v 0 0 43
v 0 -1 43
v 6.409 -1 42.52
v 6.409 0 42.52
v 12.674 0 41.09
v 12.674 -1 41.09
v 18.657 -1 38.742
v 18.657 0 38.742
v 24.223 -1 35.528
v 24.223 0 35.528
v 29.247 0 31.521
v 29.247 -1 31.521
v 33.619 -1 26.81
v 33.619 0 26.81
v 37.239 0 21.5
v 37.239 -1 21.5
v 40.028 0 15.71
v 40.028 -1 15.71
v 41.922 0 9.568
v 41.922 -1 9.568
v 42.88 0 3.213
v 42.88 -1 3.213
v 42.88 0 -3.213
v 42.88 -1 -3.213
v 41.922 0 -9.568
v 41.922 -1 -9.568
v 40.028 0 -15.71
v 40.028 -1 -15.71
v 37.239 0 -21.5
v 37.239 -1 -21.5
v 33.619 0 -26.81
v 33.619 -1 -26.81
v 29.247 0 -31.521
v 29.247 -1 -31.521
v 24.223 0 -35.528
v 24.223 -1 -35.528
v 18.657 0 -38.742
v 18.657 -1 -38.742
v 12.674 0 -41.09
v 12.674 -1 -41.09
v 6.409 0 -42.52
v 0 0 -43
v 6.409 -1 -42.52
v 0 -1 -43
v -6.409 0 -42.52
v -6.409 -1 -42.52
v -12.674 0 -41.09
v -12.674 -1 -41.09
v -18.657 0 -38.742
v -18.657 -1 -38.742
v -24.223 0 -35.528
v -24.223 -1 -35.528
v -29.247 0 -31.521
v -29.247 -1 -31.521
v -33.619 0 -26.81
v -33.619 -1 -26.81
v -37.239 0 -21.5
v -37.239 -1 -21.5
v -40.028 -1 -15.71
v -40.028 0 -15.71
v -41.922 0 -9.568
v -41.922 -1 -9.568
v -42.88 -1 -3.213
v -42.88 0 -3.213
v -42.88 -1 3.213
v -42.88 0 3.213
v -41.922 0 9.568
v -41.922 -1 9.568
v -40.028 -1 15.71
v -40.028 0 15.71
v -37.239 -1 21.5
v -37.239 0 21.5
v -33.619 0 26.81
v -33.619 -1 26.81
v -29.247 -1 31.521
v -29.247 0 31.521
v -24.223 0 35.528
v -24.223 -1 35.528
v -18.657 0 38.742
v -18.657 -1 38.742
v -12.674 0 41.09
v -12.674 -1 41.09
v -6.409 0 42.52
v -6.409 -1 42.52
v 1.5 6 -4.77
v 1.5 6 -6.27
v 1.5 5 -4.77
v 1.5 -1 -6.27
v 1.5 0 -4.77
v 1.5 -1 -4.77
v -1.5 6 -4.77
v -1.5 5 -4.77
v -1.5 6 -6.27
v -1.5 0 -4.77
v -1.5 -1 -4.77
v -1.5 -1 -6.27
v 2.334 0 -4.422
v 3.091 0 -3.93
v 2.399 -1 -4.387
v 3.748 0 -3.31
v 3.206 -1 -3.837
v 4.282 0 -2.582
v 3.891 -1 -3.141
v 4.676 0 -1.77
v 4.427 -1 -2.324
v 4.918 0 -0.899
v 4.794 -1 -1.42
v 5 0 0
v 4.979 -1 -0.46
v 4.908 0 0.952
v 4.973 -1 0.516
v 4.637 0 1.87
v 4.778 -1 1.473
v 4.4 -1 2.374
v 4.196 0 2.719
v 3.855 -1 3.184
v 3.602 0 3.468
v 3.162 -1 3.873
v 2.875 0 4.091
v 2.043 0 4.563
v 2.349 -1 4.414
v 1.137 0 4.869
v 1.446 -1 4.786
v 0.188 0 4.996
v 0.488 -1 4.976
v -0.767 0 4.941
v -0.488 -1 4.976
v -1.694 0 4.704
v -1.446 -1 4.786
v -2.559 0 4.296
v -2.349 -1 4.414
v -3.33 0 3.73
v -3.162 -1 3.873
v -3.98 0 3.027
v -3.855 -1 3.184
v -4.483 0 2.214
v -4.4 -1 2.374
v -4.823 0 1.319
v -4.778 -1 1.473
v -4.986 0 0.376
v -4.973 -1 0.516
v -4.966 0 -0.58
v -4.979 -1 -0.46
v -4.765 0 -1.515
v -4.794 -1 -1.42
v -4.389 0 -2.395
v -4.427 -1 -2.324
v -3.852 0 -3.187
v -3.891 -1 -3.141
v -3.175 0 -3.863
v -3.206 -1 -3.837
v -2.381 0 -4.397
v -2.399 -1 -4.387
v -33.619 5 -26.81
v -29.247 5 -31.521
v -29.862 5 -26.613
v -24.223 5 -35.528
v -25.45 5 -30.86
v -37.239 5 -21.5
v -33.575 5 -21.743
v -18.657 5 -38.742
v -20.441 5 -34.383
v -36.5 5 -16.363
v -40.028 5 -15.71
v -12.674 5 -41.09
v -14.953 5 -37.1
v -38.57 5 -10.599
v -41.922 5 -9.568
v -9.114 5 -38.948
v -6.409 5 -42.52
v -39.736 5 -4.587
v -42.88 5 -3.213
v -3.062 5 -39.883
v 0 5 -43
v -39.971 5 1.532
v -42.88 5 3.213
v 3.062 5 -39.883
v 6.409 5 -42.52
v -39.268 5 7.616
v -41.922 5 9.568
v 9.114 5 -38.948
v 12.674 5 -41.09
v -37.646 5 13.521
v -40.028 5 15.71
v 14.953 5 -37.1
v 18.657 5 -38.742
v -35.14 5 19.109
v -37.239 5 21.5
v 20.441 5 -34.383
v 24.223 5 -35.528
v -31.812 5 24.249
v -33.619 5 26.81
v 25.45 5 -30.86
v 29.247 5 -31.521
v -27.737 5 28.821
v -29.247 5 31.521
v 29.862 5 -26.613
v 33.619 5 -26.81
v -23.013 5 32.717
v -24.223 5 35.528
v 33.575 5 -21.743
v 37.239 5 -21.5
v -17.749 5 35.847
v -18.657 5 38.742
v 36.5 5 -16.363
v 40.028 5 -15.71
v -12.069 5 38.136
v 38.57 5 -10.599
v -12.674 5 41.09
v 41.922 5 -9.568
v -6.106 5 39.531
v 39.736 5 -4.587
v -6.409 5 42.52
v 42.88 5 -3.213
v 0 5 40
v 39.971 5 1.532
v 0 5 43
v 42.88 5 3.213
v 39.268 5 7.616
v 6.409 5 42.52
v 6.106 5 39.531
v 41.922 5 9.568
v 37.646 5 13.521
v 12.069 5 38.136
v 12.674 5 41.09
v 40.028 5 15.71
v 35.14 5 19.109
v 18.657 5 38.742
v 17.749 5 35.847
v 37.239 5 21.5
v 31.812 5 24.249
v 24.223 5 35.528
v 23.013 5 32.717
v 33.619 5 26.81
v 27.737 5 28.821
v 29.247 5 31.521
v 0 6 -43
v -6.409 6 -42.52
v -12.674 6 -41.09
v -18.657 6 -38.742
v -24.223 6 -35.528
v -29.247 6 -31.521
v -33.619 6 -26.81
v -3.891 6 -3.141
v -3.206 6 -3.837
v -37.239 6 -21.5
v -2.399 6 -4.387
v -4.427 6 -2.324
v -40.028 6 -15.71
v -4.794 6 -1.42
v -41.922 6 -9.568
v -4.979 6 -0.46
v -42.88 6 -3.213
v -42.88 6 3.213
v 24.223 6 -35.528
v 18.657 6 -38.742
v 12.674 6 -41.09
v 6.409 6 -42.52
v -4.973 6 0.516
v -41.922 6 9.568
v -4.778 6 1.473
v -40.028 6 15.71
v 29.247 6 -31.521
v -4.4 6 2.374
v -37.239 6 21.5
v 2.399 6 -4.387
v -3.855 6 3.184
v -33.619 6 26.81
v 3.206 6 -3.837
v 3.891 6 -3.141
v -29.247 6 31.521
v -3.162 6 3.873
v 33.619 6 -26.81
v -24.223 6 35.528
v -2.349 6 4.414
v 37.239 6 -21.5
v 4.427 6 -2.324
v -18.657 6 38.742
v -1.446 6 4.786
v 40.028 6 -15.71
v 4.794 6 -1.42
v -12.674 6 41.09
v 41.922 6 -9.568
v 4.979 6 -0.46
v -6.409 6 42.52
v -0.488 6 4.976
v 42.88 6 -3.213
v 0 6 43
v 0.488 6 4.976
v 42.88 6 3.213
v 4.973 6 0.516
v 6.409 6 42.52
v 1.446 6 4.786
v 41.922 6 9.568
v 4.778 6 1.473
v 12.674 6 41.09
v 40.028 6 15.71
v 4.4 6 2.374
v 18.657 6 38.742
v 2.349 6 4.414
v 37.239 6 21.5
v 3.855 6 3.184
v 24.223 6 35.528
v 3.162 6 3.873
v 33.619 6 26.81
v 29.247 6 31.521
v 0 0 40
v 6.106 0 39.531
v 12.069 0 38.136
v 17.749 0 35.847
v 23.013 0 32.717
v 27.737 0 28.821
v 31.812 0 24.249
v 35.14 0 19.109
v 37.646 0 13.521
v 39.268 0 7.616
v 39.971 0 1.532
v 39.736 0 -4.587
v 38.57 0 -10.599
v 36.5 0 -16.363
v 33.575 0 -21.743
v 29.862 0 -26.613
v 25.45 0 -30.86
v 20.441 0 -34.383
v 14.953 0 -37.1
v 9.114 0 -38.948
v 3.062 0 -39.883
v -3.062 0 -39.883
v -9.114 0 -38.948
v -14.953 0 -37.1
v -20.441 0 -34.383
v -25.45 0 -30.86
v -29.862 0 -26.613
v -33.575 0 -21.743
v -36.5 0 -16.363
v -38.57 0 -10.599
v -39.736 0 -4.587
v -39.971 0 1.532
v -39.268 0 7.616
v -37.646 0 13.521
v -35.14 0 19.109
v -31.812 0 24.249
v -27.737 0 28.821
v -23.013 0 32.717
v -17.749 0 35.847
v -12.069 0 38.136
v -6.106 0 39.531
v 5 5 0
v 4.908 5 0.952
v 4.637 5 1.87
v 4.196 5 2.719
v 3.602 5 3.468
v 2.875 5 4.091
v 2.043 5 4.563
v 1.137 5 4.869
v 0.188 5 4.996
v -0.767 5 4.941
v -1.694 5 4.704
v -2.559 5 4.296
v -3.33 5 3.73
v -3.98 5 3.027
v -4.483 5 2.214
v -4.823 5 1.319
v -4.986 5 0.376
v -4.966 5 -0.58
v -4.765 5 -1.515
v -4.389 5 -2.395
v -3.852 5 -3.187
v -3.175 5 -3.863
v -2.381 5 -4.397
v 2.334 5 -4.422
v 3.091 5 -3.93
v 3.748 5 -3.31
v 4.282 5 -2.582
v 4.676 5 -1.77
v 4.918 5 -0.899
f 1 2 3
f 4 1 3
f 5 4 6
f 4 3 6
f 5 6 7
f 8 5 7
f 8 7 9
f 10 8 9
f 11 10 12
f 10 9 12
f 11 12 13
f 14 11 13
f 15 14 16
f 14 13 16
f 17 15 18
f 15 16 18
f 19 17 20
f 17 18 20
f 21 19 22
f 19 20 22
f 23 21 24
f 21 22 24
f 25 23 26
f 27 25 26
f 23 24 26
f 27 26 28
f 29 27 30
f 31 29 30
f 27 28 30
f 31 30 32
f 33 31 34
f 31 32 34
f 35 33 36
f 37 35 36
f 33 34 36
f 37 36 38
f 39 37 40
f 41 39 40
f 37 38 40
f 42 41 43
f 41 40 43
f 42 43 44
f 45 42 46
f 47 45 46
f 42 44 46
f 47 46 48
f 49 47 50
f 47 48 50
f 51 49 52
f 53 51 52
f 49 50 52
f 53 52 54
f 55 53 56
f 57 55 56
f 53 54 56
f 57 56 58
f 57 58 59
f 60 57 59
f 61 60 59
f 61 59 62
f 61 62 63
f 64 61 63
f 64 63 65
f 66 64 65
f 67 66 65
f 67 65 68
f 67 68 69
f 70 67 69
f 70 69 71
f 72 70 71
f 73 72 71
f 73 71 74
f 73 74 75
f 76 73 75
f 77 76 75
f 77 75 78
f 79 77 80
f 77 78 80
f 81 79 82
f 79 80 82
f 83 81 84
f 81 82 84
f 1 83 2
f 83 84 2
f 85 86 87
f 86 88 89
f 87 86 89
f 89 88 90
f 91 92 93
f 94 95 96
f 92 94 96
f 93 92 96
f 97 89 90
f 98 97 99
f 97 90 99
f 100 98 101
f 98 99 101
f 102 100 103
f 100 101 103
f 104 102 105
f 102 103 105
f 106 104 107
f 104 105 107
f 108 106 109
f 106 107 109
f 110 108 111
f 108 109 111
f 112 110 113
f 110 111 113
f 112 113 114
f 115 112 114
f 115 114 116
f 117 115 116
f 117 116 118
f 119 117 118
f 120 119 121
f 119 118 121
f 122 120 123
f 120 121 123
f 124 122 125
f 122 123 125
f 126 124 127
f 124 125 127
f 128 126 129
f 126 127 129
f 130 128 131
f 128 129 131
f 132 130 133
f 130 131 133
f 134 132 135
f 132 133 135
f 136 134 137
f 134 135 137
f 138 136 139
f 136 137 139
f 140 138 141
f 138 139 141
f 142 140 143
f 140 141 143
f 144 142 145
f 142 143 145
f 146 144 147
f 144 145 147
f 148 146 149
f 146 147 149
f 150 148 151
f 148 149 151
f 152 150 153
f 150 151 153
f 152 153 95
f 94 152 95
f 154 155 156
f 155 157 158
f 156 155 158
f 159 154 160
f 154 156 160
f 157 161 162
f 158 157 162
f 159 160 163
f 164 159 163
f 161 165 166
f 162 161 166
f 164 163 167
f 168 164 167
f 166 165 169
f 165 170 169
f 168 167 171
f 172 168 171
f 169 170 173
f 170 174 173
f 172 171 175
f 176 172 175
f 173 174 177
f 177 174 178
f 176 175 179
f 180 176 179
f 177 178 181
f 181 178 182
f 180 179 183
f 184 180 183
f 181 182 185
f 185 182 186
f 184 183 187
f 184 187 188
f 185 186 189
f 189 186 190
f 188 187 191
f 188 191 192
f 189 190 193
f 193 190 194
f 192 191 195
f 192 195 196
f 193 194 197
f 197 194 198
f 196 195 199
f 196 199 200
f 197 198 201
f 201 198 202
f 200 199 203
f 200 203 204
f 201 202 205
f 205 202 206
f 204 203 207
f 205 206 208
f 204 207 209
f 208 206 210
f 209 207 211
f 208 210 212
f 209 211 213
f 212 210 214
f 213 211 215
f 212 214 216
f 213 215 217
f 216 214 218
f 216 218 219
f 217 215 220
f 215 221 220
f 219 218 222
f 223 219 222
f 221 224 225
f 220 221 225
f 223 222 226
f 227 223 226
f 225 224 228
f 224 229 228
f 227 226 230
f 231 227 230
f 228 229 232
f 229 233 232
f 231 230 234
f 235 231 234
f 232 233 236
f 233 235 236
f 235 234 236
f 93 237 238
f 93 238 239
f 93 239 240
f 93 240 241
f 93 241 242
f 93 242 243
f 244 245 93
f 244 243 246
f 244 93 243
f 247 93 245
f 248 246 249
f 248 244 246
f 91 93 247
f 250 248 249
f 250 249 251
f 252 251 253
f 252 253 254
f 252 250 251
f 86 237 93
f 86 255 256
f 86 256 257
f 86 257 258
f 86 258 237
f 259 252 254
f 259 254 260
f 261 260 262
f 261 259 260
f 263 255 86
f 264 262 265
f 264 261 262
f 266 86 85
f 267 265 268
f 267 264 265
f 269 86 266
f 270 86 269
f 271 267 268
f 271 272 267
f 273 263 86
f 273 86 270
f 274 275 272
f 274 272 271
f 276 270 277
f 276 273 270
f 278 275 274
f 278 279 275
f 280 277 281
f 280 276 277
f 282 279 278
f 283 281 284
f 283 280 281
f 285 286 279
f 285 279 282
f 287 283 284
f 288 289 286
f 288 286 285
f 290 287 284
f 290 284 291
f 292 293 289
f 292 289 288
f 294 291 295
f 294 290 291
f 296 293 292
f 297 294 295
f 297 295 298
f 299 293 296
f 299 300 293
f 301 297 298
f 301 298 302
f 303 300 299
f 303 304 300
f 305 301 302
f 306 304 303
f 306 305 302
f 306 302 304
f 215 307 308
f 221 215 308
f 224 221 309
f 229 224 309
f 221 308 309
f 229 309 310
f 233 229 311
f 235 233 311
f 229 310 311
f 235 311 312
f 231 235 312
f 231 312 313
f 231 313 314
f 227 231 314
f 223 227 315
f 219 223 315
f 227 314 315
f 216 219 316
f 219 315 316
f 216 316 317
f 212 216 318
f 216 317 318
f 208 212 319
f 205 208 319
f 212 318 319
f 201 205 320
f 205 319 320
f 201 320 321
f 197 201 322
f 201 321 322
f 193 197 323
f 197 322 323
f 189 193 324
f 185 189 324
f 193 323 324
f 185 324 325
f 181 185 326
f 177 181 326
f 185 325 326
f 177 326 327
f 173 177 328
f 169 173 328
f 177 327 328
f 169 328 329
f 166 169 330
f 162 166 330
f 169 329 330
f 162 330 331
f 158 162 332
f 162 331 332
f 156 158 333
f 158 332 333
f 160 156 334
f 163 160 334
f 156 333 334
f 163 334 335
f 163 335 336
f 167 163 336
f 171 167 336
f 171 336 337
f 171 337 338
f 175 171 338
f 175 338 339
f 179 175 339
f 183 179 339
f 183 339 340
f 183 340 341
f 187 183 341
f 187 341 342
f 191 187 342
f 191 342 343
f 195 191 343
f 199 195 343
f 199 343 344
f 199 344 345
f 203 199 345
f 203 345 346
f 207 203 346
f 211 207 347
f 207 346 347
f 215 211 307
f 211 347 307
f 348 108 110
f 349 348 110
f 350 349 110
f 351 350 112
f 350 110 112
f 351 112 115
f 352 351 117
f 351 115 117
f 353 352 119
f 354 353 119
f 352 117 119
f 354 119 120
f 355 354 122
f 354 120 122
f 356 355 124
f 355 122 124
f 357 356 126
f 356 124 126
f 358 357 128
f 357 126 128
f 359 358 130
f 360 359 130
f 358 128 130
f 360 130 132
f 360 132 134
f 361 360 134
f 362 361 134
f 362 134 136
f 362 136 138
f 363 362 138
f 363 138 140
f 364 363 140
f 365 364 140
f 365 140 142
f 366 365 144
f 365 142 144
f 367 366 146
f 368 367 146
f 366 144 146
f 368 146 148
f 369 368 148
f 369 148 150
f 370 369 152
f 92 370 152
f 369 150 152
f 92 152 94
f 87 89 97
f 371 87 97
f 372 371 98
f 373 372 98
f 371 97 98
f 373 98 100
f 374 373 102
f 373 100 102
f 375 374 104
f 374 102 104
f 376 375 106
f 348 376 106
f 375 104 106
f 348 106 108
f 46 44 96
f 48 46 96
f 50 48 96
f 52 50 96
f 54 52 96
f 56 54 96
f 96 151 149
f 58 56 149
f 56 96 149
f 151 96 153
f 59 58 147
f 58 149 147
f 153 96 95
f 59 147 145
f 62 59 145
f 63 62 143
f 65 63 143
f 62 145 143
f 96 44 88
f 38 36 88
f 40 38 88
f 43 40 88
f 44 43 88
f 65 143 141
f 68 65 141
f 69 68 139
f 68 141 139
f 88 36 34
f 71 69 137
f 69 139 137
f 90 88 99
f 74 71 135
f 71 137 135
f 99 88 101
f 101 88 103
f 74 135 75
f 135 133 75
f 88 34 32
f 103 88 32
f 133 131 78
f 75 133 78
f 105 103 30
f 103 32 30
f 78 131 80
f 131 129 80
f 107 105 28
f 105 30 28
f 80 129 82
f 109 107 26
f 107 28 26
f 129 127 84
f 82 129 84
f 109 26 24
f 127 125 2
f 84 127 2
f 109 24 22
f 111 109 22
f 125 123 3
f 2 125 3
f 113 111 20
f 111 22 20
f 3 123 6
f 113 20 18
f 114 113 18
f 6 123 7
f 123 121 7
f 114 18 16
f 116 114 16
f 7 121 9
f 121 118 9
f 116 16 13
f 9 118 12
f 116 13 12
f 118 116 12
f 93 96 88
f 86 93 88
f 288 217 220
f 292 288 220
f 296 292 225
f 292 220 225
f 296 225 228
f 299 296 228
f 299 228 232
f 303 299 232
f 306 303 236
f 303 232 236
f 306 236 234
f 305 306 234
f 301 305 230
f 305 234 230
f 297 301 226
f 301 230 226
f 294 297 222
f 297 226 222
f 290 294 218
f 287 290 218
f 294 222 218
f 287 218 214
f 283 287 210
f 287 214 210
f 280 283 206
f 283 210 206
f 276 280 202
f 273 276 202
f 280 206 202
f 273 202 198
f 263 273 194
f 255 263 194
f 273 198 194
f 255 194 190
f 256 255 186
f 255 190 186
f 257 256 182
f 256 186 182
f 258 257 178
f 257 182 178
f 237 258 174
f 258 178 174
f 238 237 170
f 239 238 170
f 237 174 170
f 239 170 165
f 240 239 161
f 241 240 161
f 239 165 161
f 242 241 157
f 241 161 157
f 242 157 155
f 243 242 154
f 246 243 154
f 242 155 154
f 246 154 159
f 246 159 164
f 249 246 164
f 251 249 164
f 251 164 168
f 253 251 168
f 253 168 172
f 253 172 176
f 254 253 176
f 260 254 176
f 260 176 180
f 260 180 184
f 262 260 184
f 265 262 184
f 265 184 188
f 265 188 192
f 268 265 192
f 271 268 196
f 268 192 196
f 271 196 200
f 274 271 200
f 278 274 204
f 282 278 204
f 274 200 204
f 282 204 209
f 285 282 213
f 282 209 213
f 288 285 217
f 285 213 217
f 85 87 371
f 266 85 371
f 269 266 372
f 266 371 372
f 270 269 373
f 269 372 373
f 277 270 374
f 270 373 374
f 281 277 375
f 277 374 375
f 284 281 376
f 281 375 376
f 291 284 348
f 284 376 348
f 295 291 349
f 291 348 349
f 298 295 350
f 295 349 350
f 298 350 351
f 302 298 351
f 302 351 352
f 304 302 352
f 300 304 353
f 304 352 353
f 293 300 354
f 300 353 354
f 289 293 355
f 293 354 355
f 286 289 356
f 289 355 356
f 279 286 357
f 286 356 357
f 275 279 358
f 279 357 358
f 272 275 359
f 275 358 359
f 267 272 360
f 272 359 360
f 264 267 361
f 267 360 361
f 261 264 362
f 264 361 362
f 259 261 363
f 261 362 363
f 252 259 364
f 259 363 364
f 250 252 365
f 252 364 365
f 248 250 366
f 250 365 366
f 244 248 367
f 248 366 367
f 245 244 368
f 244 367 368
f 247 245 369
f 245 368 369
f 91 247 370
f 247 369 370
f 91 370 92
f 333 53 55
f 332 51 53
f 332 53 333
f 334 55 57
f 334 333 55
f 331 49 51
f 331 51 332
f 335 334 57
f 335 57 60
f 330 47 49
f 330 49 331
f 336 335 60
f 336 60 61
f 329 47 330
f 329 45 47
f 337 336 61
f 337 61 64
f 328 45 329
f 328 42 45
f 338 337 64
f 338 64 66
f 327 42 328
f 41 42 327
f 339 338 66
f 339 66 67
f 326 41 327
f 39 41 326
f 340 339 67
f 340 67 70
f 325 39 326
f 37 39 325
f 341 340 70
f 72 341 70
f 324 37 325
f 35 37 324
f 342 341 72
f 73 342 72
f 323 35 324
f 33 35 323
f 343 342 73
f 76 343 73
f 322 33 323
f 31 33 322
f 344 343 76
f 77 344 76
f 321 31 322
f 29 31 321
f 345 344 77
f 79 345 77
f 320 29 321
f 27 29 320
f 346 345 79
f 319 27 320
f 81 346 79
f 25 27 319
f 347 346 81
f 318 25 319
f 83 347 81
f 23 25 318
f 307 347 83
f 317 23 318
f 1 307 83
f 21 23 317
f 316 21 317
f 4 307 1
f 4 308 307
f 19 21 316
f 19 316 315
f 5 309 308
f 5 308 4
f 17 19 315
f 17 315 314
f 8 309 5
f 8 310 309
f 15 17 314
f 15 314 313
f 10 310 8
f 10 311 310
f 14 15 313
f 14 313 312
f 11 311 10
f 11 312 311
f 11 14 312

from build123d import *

# Parameters (mm, degrees)
SKETCH1_R           = 40
BOSS_EXTRUDE1_DEPTH = 5
BOSS_EXTRUDE2_START = -1
SKETCH1_3_R         = 43
BOSS_EXTRUDE2_DEPTH = 1
BOSS_EXTRUDE3_START = 5
SKETCH1_4_R         = 43
BOSS_EXTRUDE3_DEPTH = 1


with BuildPart() as part:
    # Sketch1 → Boss-Extrude1 (new body)
    with BuildSketch(Plane(origin=(0, 0, 0), x_dir=(1, 0, 0), z_dir=(0, 1, 0))):
        with Locations(Location((0, 0, 0), (0, 0, 270))):
            Circle(SKETCH1_R)
        with BuildLine():
            ThreePointArc((5, 0), (-2.958039892, -4.031128874), (-1.5, 4.769696007))
            Line((-1.5, 4.769696007), (-1.5, 6.269696007))
            Line((-1.5, 6.269696007), (1.5, 6.269696007))
            Line((1.5, 6.269696007), (1.5, 4.769696007))
            ThreePointArc((1.5, 4.769696007), (4.031128874, 2.958039892), (5, 0))
        make_face(mode=Mode.SUBTRACT)
    extrude(amount=BOSS_EXTRUDE1_DEPTH)

    # Sketch1<3> → Boss-Extrude2 (add)
    with BuildSketch(Plane(origin=(0, 0, 0), x_dir=(1, 0, 0), z_dir=(0, 1, 0)).offset(BOSS_EXTRUDE2_START)):
        with Locations(Location((0, 0, 0), (0, 0, 270))):
            Circle(SKETCH1_3_R)
        with BuildLine():
            Line((-1.5, 4.769696007), (-1.5, 6.269696007))
            Line((-1.5, 6.269696007), (1.5, 6.269696007))
            Line((1.5, 6.269696007), (1.5, 4.769696007))
            ThreePointArc((1.5, 4.769696007), (0, -5), (-1.5, 4.769696007))
        make_face(mode=Mode.SUBTRACT)
    extrude(amount=BOSS_EXTRUDE2_DEPTH)

    # Sketch1<4> → Boss-Extrude3 (add)
    with BuildSketch(Plane(origin=(0, 0, 0), x_dir=(1, 0, 0), z_dir=(0, 1, 0)).offset(BOSS_EXTRUDE3_START)):
        with Locations(Location((0, 0, 0), (0, 0, 270))):
            Circle(SKETCH1_4_R)
        with BuildLine():
            Line((-1.5, 4.769696007), (-1.5, 6.269696007))
            Line((-1.5, 6.269696007), (1.5, 6.269696007))
            Line((1.5, 6.269696007), (1.5, 4.769696007))
            ThreePointArc((1.5, 4.769696007), (0, -5), (-1.5, 4.769696007))
        make_face(mode=Mode.SUBTRACT)
    extrude(amount=BOSS_EXTRUDE3_DEPTH)


solid = part.part
